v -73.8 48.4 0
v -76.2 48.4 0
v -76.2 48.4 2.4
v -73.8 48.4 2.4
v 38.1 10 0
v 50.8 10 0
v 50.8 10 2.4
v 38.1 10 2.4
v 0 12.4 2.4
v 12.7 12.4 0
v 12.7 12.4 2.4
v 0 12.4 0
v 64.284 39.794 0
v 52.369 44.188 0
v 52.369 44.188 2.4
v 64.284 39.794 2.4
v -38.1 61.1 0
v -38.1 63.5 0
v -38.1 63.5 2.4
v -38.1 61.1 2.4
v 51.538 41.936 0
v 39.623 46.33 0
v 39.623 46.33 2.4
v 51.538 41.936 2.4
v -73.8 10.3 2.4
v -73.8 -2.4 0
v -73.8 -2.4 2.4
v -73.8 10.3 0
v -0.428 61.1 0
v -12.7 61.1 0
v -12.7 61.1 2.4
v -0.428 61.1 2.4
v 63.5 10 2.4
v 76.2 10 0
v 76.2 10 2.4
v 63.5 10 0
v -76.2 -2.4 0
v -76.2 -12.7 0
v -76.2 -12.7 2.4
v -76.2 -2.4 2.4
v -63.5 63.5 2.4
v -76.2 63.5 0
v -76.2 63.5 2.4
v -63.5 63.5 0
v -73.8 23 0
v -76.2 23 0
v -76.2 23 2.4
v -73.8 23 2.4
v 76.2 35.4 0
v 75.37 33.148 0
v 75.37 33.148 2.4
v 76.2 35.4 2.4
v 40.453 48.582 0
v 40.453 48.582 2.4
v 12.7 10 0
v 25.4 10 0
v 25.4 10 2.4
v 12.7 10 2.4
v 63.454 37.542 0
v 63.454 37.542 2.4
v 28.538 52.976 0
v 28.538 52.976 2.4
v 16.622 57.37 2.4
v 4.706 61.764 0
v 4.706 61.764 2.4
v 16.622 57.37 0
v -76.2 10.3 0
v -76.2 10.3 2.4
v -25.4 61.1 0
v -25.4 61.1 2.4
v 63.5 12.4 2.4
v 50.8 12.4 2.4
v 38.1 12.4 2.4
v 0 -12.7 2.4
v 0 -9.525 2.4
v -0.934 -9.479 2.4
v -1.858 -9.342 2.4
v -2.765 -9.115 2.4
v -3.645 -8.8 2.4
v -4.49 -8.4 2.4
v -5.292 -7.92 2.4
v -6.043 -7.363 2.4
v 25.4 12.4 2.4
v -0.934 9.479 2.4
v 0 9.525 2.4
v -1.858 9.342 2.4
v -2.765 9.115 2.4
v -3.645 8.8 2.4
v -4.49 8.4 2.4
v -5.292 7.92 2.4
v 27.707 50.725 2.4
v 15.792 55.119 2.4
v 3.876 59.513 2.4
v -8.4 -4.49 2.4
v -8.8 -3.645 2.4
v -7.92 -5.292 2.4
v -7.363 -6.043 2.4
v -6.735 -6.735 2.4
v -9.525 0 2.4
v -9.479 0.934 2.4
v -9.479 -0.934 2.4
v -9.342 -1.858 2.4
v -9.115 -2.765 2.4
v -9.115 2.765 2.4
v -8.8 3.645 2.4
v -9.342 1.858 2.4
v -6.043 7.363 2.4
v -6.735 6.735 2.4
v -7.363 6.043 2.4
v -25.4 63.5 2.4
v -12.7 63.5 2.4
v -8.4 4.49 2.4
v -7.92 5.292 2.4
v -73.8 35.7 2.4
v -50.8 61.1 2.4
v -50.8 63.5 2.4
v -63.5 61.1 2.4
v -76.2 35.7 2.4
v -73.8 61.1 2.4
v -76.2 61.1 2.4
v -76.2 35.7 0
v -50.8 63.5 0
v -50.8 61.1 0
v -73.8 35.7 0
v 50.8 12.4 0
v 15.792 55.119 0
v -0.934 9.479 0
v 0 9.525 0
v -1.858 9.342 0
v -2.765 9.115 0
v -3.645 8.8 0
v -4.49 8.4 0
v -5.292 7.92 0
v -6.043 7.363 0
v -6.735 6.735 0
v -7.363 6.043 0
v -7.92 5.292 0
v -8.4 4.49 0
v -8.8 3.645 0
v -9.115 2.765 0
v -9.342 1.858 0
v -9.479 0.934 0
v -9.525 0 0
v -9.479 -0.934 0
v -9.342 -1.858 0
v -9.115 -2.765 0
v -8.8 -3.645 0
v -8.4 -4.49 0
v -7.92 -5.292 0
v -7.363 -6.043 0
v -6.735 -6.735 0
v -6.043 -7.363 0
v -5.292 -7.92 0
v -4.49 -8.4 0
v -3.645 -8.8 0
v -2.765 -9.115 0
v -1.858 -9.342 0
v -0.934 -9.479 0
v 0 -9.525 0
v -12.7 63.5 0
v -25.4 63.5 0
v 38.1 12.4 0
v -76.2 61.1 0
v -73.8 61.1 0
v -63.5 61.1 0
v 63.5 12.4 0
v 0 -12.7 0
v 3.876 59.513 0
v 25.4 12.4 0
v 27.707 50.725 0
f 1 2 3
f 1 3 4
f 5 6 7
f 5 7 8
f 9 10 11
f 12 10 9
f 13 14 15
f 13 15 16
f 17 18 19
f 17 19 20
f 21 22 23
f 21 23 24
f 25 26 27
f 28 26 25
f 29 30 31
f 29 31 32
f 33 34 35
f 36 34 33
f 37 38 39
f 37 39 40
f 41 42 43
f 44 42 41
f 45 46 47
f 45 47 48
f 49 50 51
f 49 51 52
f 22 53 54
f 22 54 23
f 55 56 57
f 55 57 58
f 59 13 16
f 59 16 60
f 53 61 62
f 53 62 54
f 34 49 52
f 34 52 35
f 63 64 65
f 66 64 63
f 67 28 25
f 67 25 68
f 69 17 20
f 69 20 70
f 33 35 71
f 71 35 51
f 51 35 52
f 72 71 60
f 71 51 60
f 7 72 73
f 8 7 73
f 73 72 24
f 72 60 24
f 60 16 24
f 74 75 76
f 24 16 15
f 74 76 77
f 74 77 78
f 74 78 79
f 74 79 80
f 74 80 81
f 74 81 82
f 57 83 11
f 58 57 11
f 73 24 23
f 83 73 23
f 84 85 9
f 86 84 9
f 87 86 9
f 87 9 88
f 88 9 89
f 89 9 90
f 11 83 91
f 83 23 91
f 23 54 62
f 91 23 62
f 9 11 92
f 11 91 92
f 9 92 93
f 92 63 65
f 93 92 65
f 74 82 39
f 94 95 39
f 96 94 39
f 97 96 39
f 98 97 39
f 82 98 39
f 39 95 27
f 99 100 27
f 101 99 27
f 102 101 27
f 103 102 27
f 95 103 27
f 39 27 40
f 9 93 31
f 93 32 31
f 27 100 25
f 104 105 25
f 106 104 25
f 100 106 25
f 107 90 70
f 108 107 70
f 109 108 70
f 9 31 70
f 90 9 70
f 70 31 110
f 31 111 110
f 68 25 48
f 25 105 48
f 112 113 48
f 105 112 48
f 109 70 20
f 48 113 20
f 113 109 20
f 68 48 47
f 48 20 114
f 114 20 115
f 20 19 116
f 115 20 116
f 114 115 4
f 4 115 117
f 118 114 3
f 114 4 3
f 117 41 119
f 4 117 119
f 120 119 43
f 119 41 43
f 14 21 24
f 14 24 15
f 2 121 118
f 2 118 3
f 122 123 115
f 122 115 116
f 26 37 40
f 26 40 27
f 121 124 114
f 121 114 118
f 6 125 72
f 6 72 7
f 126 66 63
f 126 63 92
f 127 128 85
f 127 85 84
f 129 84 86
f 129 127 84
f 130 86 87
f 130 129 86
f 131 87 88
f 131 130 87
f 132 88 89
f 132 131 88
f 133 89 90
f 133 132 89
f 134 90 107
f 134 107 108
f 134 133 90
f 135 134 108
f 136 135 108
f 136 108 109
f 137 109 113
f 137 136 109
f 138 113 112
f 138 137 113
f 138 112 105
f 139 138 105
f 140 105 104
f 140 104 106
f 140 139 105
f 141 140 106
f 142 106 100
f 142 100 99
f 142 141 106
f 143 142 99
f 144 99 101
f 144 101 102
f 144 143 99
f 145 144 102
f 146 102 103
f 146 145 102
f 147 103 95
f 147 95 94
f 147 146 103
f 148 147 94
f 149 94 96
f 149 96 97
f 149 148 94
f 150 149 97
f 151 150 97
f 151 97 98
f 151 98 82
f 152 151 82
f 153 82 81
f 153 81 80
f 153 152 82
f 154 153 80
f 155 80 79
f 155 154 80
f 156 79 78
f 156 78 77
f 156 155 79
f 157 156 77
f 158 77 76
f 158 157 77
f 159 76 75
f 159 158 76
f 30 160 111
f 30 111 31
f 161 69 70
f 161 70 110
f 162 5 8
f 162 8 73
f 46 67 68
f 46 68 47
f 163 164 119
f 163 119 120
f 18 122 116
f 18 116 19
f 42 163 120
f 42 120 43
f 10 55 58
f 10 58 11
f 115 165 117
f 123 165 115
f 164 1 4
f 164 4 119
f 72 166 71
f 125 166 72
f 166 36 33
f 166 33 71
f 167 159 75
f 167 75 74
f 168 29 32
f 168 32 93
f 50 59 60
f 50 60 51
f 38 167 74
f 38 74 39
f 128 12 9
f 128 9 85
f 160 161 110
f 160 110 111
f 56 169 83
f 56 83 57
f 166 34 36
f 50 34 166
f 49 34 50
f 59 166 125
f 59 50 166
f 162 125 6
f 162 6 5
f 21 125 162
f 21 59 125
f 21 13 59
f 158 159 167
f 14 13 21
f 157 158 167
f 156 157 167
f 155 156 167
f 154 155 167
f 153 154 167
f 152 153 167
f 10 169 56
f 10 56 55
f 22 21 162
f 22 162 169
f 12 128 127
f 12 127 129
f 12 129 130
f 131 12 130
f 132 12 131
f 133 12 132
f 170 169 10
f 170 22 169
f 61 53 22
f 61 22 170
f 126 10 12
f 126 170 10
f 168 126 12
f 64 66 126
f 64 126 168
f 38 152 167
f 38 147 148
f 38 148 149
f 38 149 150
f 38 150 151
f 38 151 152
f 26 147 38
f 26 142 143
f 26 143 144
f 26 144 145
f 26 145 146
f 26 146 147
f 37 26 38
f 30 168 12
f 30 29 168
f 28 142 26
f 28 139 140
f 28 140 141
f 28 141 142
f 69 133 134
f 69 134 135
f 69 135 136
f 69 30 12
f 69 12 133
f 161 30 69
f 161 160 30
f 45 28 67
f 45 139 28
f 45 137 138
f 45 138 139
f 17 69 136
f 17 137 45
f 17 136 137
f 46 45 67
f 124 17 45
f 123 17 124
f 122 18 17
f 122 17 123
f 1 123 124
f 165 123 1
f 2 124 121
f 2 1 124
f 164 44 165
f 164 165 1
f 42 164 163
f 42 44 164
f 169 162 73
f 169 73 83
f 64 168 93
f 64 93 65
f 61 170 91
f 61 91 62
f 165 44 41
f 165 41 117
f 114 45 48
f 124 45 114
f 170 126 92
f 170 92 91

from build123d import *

# Parameters (mm, degrees)
BOSS_EXTRUDE1_DEPTH = 2.4


with BuildPart() as part:
    # Sketch1 → Boss-Extrude1 (new body)
    with BuildSketch(Plane.XY):
        with BuildLine():
            Line((-76.2, -12.7), (-76.2, -2.4))
            Line((-76.2, -2.4), (-73.8, -2.4))
            Line((-73.8, -2.4), (-73.8, 10.3))
            Line((-73.8, 10.3), (-76.2, 10.3))
            Line((-76.2, 10.3), (-76.2, 23))
            Line((-76.2, 23), (-73.8, 23))
            Line((-73.8, 23), (-73.8, 35.7))
            Line((-73.8, 35.7), (-76.2, 35.7))
            Line((-76.2, 35.7), (-76.2, 48.4))
            Line((-76.2, 48.4), (-73.8, 48.4))
            Line((-73.8, 48.4), (-73.8, 61.1))
            Line((-73.8, 61.1), (-76.2, 61.1))
            Line((-76.2, 61.1), (-76.2, 63.5))
            Line((-76.2, 63.5), (-63.5, 63.5))
            Line((-63.5, 63.5), (-63.5, 61.1))
            Line((-63.5, 61.1), (-50.8, 61.1))
            Line((-50.8, 61.1), (-50.8, 63.5))
            Line((-50.8, 63.5), (-38.1, 63.5))
            Line((-38.1, 63.5), (-38.1, 61.1))
            Line((-38.1, 61.1), (-25.4, 61.1))
            Line((-25.4, 61.1), (-25.4, 63.5))
            Line((-25.4, 63.5), (-12.7, 63.5))
            Line((-12.7, 63.5), (-12.7, 61.1))
            Line((-12.7, 61.1), (-0.428418776, 61.1))
            Line((-0.428418776, 61.1), (3.875889615, 59.512715672))
            Line((3.875889615, 59.512715672), (4.706267152, 61.764486785))
            Line((4.706267152, 61.764486785), (16.621889293, 57.370405654))
            Line((16.621889293, 57.370405654), (15.791511757, 55.118634541))
            Line((15.791511757, 55.118634541), (27.707133898, 50.72455341))
            Line((27.707133898, 50.72455341), (28.537511435, 52.976324523))
            Line((28.537511435, 52.976324523), (40.453133576, 48.582243393))
            Line((40.453133576, 48.582243393), (39.622756039, 46.330472279))
            Line((39.622756039, 46.330472279), (51.538378181, 41.936391148))
            Line((51.538378181, 41.936391148), (52.368755717, 44.188162262))
            Line((52.368755717, 44.188162262), (64.284377859, 39.794081131))
            Line((64.284377859, 39.794081131), (63.454000322, 37.542310018))
            Line((63.454000322, 37.542310018), (75.369622463, 33.148228887))
            Line((75.369622463, 33.148228887), (76.2, 35.4))
            Line((76.2, 35.4), (76.2, 10))
            Line((76.2, 10), (63.5, 10))
            Line((63.5, 10), (63.5, 12.4))
            Line((63.5, 12.4), (50.8, 12.4))
            Line((50.8, 12.4), (50.8, 10))
            Line((50.8, 10), (38.1, 10))
            Line((38.1, 10), (38.1, 12.4))
            Line((38.1, 12.4), (25.4, 12.4))
            Line((25.4, 12.4), (25.4, 10))
            Line((25.4, 10), (12.7, 10))
            Line((12.7, 10), (12.7, 12.4))
            Line((12.7, 12.4), (0, 12.4))
            Line((0, 12.4), (0, 10))
            Line((0, 10), (0, 9.525))
            ThreePointArc((0, 9.525), (-9.525, 0), (0, -9.525))
            Line((0, -9.525), (0, -12.7))
            Line((0, -12.7), (-76.2, -12.7))
        make_face()
    extrude(amount=BOSS_EXTRUDE1_DEPTH)


solid = part.part
